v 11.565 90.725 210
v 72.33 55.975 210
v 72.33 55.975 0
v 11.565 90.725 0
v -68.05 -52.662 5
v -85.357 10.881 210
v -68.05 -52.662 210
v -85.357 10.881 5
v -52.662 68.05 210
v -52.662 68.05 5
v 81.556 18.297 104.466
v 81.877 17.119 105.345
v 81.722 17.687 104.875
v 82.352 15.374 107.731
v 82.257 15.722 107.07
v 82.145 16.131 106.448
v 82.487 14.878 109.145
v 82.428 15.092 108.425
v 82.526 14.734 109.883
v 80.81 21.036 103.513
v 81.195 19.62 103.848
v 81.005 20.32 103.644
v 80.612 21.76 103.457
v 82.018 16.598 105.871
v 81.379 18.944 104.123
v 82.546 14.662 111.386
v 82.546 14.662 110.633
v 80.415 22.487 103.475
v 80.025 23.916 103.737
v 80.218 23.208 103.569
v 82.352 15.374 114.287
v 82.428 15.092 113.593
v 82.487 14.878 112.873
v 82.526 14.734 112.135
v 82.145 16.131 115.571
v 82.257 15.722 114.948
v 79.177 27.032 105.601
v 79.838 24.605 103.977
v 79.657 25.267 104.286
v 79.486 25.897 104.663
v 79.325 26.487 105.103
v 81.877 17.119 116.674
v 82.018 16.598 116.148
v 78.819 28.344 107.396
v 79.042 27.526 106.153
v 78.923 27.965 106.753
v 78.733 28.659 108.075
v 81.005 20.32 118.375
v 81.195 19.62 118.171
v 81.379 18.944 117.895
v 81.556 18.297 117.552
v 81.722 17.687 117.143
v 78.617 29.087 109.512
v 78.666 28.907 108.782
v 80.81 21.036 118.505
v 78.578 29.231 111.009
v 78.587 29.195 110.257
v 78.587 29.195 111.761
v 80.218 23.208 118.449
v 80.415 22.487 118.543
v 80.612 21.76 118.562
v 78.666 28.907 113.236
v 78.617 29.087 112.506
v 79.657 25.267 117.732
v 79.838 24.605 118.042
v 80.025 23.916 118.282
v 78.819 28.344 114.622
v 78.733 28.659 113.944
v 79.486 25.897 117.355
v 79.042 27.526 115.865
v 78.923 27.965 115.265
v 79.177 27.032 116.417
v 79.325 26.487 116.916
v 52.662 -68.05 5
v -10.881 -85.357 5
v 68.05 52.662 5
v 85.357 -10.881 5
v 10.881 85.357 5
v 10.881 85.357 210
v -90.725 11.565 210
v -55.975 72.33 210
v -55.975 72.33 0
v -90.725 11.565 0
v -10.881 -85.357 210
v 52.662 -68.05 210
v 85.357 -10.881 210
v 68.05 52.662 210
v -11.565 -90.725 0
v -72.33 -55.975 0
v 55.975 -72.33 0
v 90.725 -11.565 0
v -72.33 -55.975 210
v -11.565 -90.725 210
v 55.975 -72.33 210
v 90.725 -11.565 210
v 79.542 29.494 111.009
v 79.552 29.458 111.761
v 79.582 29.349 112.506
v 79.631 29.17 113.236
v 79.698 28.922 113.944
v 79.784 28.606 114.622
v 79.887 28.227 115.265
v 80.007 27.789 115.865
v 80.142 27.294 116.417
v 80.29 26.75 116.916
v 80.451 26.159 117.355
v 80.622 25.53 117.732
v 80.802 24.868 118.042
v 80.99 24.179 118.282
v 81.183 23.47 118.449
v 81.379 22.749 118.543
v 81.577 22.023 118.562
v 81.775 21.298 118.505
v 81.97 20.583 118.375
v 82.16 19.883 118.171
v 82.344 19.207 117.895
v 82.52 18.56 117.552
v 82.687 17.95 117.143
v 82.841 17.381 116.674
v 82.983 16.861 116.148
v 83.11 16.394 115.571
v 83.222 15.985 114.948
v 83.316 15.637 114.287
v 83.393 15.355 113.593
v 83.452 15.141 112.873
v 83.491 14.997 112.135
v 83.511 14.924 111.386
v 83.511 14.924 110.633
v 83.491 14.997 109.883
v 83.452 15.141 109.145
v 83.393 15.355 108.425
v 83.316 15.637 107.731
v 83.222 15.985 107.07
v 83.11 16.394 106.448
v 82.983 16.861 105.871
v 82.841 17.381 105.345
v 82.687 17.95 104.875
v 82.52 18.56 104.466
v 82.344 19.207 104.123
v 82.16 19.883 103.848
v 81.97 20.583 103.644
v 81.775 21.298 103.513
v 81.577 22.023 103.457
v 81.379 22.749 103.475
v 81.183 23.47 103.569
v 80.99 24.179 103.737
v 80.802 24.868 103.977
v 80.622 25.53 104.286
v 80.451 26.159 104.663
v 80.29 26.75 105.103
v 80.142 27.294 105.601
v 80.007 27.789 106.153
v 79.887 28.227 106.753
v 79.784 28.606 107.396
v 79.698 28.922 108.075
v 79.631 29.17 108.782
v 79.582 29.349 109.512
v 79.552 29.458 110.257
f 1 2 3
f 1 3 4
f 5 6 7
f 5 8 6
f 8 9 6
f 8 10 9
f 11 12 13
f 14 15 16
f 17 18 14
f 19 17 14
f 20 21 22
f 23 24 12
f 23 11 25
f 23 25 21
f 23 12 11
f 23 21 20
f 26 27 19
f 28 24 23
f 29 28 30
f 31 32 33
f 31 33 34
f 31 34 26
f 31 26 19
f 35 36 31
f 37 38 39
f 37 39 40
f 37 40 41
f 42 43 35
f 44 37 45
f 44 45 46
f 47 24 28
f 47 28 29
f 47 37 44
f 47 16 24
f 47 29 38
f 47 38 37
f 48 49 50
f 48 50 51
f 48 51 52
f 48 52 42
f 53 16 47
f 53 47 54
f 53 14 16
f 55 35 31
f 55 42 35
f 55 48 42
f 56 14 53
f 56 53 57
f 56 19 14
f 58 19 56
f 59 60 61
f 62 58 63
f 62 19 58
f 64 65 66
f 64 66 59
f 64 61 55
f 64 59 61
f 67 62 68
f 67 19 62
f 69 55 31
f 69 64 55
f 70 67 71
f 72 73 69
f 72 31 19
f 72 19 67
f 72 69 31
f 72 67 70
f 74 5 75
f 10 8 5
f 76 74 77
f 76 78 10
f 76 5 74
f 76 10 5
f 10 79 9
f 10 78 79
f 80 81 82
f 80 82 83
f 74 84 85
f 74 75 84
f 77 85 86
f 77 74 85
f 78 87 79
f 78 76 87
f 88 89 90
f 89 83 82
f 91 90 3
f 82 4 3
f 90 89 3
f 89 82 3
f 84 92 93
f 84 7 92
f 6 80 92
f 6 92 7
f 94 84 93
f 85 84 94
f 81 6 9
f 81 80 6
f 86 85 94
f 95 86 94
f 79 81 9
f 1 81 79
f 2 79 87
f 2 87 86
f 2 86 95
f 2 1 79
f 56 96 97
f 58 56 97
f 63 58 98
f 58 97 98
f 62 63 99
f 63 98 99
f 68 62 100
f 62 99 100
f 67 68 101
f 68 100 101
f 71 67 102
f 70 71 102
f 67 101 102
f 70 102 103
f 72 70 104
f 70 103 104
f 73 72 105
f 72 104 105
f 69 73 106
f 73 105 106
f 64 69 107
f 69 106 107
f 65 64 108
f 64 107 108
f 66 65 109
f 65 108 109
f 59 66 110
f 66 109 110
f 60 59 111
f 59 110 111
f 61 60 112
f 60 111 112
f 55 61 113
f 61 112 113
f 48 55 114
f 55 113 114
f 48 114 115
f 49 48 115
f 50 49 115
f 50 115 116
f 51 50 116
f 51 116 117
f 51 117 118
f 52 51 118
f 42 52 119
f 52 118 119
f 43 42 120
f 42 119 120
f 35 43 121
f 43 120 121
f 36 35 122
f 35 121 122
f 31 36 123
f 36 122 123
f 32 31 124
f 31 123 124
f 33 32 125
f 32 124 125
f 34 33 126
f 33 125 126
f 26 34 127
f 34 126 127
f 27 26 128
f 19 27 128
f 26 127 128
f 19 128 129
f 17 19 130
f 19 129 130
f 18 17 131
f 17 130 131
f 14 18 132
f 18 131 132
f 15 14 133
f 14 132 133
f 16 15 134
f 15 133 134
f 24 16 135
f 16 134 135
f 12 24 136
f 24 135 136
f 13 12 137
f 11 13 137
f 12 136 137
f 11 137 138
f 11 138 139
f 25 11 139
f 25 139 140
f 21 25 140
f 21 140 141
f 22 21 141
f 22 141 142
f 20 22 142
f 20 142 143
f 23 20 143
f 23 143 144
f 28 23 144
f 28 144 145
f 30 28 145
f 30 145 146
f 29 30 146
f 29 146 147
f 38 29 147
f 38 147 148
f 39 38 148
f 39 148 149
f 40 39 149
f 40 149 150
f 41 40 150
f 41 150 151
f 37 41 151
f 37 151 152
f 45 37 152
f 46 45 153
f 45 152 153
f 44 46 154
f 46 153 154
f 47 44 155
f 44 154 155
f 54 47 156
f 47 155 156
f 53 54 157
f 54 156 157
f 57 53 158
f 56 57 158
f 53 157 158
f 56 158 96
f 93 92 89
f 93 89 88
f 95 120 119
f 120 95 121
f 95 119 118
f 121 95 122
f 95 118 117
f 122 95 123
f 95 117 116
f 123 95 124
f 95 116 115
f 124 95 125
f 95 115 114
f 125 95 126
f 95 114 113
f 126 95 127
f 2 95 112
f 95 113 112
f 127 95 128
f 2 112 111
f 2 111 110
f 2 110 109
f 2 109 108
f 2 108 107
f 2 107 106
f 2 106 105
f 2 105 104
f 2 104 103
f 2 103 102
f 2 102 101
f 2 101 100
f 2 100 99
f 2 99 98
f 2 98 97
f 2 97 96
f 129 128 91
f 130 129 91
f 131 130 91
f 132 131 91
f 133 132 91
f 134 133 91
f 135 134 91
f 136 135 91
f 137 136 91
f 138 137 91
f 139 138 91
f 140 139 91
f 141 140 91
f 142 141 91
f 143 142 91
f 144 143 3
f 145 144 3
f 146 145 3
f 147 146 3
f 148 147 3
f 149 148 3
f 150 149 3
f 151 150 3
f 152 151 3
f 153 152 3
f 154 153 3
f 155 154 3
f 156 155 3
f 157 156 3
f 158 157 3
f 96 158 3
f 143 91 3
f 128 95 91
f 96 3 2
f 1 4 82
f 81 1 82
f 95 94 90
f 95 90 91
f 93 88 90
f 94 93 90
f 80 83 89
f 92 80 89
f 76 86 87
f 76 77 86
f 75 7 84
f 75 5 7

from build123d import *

# Parameters (mm, degrees)
F1_DEPTH = 210
F2_T     = -5
F3_R     = 7.5548203201
F4_DEPTH = 1


with BuildPart() as f1:
    # F0 (on Top) → F1 (new body)
    with BuildSketch(Plane.XY):
        Polygon((55.9746139076, -72.3302552581), (90.7252430464, -11.5651849096), (72.3302552581, 55.9746139076), (11.5651849096, 90.7252430464), (-55.9746139076, 72.3302552581), (-90.7252430464, 11.5651849096), (-72.3302552581, -55.9746139076), (-11.5651849096, -90.7252430464), align=None)
    extrude(amount=F1_DEPTH)

    # F2
    f2_openings = [f1.faces().sort_by_distance(p)[0] for p in [
        (0, 0, 210),
    ]]
    offset(amount=F2_T, openings=f2_openings)

    # F3 (on face) → F4 (cut)
    with BuildSketch(Plane(origin=(81.5277491522, 22.204714499, 0), x_dir=(-0.2627855398, 0.9648542688, 0), z_dir=(0.9648542688, 0.2627855398, 0))):
        with Locations((0, 111.0091432929)):
            Circle(F3_R)
    extrude(amount=-F4_DEPTH, mode=Mode.SUBTRACT)


solid = f1.part
